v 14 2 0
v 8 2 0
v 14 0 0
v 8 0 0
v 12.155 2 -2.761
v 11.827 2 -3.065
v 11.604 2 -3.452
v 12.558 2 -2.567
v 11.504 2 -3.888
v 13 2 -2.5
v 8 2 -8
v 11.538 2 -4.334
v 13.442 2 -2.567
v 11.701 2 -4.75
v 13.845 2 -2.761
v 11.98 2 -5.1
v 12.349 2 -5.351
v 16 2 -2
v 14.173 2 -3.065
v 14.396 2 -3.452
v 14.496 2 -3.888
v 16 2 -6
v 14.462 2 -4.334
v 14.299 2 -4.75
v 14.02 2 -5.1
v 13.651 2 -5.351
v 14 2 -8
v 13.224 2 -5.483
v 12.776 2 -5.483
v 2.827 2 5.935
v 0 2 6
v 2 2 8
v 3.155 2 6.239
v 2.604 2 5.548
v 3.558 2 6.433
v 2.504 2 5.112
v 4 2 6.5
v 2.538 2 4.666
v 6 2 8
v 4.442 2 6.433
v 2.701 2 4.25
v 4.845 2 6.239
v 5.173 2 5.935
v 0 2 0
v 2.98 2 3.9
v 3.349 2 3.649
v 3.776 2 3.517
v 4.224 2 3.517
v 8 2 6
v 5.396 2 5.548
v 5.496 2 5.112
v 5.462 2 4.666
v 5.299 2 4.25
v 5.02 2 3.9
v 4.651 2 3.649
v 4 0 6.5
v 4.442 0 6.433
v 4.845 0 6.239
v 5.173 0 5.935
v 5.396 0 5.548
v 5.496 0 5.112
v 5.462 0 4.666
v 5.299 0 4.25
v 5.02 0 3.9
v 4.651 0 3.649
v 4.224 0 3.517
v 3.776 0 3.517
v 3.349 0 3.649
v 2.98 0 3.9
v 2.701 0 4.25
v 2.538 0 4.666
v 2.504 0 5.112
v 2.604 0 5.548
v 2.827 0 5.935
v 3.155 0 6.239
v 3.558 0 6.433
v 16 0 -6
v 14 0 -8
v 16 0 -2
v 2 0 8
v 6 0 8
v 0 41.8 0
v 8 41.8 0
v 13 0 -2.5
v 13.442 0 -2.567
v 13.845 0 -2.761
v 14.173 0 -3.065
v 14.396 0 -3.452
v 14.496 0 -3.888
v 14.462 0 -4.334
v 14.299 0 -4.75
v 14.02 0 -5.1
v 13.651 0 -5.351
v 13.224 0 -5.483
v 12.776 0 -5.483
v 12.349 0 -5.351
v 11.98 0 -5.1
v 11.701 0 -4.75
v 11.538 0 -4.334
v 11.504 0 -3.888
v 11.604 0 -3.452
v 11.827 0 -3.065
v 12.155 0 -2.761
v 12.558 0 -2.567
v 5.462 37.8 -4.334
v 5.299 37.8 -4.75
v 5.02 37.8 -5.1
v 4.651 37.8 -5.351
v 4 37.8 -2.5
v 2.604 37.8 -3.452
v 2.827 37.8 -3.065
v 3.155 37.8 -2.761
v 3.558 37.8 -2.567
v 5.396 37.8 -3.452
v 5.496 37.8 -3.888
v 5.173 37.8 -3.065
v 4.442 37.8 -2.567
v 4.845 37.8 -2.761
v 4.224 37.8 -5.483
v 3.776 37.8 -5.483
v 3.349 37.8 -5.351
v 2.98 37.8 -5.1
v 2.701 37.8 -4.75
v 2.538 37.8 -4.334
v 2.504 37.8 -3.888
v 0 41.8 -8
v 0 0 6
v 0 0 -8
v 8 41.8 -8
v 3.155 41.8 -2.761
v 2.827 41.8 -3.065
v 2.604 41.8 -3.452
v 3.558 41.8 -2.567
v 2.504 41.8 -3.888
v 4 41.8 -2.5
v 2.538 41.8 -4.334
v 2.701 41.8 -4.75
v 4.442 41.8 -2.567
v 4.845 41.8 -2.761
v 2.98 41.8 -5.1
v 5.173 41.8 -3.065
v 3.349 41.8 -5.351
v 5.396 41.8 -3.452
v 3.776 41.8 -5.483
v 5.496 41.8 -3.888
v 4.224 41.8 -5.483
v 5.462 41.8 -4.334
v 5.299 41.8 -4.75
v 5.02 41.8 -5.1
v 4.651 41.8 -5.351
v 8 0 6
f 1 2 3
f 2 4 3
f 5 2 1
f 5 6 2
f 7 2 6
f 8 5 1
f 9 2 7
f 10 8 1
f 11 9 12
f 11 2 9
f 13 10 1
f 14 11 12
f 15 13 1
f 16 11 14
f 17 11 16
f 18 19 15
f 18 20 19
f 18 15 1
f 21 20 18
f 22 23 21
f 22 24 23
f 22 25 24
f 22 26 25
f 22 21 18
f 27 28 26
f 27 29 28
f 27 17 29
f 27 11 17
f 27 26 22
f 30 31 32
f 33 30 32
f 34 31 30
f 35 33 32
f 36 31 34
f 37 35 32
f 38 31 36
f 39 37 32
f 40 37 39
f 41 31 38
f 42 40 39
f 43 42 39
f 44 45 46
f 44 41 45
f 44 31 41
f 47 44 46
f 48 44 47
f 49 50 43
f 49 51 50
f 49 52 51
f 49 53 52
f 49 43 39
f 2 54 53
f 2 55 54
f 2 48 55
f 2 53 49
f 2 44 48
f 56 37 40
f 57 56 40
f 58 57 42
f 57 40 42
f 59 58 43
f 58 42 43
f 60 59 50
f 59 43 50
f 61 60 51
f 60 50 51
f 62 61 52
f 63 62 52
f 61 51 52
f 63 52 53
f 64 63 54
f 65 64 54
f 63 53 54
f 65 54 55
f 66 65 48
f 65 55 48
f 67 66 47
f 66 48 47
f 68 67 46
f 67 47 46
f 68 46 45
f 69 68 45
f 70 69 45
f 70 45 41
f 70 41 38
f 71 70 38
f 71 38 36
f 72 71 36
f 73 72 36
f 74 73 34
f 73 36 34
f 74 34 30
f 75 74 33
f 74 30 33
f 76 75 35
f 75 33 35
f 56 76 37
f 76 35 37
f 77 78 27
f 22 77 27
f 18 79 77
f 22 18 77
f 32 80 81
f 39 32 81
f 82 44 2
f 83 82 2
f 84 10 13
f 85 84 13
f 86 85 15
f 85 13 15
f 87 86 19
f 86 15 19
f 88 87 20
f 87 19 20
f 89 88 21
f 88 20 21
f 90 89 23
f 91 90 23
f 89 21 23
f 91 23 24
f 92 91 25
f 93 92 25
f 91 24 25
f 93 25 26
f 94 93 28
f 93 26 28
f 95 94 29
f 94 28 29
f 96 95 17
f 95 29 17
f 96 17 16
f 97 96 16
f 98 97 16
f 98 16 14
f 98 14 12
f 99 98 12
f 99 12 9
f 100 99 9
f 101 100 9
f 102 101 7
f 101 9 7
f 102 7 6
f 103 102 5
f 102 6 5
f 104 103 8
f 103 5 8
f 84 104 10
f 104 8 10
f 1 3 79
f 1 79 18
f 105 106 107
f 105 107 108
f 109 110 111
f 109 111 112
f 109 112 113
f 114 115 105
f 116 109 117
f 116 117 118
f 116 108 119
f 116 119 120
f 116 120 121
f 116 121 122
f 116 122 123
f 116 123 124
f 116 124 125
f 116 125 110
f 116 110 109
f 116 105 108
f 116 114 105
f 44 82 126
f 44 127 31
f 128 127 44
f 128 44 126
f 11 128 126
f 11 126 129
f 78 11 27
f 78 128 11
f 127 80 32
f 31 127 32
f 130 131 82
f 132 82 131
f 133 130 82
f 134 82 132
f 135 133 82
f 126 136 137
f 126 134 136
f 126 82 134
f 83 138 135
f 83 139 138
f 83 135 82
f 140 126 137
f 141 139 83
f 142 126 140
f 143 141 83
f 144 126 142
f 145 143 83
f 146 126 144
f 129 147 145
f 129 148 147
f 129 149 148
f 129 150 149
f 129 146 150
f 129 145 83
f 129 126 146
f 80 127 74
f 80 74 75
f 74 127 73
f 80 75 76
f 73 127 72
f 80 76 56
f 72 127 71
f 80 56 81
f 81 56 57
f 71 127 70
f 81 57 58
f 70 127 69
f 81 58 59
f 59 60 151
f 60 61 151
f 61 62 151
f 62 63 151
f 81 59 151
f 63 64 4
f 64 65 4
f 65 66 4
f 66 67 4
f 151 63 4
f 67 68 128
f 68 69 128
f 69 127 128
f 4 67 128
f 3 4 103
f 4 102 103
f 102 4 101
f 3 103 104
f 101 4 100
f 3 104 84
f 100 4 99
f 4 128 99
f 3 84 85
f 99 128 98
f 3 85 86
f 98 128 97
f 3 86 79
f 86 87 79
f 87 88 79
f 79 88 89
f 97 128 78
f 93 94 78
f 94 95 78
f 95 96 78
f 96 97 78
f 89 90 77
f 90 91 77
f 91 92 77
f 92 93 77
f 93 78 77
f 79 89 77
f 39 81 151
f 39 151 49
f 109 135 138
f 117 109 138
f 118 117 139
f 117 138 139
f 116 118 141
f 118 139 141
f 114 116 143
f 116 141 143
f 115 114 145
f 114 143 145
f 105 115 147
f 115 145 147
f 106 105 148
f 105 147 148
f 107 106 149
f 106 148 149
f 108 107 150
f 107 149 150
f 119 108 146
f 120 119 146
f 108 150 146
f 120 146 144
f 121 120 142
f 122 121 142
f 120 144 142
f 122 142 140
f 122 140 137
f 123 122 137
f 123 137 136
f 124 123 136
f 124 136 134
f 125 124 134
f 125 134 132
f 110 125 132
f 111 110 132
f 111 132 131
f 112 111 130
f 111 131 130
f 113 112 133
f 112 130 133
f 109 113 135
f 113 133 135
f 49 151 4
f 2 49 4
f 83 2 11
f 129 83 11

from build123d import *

# Parameters (mm, degrees)
SKETCH1_W           = 8
SKETCH1_H           = 8
BOSS_EXTRUDE1_DEPTH = 41.8
SKETCH2_R           = 1.5
CUT_EXTRUDE1_DEPTH  = 4
SKETCH3_W           = 8
SKETCH3_H           = 8
BOSS_EXTRUDE2_DEPTH = 2
SKETCH4_W           = 8
SKETCH4_H           = 8
BOSS_EXTRUDE3_DEPTH = 2
CHAMFER1_SIZE       = 2
SKETCH5_R           = 1.5
CUT_EXTRUDE2_DEPTH  = 2


with BuildPart() as part:
    # Sketch1 → Boss-Extrude1 (new body)
    with BuildSketch(Plane(origin=(0, 0, 0), x_dir=(1, 0, 0), z_dir=(0, 1, 0))):
        with Locations((4, 4)):
            Rectangle(SKETCH1_W, SKETCH1_H)
    extrude(amount=BOSS_EXTRUDE1_DEPTH)

    # Sketch2 → Cut-Extrude1 (cut)
    with BuildSketch(Plane(origin=(0, 41.8, 0), x_dir=(1, 0, 0), z_dir=(0, 1, 0))):
        with Locations(Location((4, 4, 0), (0, 0, 270))):
            Circle(SKETCH2_R)
    extrude(amount=-CUT_EXTRUDE1_DEPTH, mode=Mode.SUBTRACT)

    # Sketch3 → Boss-Extrude2 (add)
    with BuildSketch(Plane(origin=(0, 0, 0), x_dir=(1, 0, 0), z_dir=(0, 1, 0))):
        with Locations((12, 4)):
            Rectangle(SKETCH3_W, SKETCH3_H)
    extrude(amount=BOSS_EXTRUDE2_DEPTH)

    # Sketch4 → Boss-Extrude3 (add)
    with BuildSketch(Plane(origin=(0, 0, 0), x_dir=(1, 0, 0), z_dir=(0, 1, 0))):
        with Locations((4, -4)):
            Rectangle(SKETCH4_W, SKETCH4_H)
    extrude(amount=BOSS_EXTRUDE3_DEPTH)

    # Chamfer1
    chamfer1_edges = [part.edges().sort_by_distance(p)[0] for p in [
        (16, 1, 0),
        (16, 1, -8),
        (0, 1, 8),
        (8, 1, 8),
    ]]
    chamfer(chamfer1_edges, length=CHAMFER1_SIZE)

    # Sketch5 → Cut-Extrude2 (cut)
    with BuildSketch(Plane(origin=(0, 2, 0), x_dir=(1, 0, 0), z_dir=(0, 1, 0))):
        with Locations(Location((4, -5, 0), (0, 0, 270))):
            Circle(SKETCH5_R)
        with Locations(Location((13, 4, 0), (0, 0, 270))):
            Circle(SKETCH5_R)
    extrude(amount=-CUT_EXTRUDE2_DEPTH, mode=Mode.SUBTRACT)


solid = part.part
